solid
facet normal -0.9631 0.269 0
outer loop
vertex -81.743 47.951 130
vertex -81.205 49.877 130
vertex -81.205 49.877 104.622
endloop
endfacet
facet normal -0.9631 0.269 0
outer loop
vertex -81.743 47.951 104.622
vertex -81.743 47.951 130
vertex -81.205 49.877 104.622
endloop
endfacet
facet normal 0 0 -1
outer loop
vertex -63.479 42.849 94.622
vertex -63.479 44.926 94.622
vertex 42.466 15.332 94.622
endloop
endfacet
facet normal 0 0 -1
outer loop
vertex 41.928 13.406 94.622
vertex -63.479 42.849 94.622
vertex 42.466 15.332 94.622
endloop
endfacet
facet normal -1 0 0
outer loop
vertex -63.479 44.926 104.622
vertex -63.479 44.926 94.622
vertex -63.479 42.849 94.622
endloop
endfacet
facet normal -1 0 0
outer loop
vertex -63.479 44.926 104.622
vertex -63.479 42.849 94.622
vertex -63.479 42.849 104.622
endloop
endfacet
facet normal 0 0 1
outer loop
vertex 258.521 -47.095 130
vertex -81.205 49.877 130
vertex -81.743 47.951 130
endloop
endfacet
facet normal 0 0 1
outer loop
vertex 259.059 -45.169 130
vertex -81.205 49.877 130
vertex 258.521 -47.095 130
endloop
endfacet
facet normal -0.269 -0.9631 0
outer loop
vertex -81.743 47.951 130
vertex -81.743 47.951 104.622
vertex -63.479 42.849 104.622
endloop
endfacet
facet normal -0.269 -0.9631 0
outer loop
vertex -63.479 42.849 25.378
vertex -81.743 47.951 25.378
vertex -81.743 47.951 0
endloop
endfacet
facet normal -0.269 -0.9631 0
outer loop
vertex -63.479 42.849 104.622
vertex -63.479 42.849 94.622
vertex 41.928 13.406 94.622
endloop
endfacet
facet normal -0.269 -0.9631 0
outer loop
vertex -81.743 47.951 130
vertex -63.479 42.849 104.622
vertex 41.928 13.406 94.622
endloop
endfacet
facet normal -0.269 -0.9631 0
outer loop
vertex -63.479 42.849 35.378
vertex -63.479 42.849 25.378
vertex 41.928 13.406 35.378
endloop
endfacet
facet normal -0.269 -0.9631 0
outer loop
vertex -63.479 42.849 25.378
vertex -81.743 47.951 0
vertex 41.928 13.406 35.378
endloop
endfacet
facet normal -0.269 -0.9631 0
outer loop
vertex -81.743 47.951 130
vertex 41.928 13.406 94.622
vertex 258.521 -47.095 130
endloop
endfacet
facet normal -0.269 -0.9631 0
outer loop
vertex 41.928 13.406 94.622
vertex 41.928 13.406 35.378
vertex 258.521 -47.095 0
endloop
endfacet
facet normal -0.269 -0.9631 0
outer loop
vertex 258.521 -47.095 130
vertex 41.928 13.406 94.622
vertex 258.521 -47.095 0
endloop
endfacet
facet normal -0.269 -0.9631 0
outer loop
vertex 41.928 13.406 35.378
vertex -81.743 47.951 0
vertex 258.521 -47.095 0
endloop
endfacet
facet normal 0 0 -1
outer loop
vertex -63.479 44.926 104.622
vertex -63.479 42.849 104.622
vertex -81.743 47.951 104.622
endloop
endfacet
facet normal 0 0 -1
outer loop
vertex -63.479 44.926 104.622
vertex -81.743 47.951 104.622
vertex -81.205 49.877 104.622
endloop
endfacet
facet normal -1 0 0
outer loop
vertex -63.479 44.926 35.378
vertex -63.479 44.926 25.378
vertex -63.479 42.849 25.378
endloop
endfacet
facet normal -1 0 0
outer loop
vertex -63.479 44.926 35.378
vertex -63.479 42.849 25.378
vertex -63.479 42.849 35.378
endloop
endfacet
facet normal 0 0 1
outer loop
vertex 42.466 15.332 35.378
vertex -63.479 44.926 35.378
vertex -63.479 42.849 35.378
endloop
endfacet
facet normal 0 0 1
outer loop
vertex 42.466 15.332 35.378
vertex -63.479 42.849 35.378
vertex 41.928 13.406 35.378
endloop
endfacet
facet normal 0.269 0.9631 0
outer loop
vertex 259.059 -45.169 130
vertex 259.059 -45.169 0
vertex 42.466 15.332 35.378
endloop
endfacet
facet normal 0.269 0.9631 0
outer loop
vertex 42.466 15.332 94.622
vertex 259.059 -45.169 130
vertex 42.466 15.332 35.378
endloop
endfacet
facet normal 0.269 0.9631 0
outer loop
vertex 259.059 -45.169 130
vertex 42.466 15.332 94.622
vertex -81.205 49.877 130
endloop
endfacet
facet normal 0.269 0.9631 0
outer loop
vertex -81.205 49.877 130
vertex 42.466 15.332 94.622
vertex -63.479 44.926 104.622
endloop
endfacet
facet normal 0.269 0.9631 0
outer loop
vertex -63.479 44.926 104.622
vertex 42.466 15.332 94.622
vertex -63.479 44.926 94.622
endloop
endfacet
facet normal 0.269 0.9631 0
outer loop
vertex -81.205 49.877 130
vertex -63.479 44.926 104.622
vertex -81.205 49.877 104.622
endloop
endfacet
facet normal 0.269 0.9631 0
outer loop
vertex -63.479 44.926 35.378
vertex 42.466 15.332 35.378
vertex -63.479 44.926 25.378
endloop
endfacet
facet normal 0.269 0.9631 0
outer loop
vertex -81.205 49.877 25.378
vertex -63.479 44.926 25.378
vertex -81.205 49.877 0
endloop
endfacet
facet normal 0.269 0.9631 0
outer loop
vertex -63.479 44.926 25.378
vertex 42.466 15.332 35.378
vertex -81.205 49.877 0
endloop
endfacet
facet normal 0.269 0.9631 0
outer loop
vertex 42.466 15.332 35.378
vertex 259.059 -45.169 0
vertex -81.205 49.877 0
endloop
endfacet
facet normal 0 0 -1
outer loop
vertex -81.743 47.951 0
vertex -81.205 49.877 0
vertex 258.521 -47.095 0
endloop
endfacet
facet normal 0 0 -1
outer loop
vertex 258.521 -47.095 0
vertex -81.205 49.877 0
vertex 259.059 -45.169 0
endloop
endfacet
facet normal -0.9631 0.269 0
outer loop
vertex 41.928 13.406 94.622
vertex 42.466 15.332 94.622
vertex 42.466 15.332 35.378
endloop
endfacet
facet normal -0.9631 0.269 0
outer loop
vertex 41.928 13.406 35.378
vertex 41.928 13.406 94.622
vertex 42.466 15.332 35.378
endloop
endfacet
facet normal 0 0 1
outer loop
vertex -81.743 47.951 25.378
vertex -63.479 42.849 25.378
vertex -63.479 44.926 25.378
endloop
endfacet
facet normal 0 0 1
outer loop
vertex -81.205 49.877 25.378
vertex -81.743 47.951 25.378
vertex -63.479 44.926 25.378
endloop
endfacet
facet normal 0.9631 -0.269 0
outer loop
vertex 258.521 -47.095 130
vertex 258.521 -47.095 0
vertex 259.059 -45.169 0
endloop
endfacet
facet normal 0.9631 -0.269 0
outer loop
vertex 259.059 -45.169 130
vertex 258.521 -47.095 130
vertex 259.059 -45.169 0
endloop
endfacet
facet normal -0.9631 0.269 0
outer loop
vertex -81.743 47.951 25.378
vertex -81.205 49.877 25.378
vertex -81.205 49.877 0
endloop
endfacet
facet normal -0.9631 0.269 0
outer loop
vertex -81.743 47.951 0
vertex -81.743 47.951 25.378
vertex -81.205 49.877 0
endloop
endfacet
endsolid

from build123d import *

# Parameters (mm, degrees)
BOSS_EXTRU_1_DEPTH      = 130
ESQUISSE2_W             = 2
ESQUISSE2_H             = 130
BOSS_EXTRU_2_DEPTH      = 96
ESQUISSE3_W             = 79.24305049
ESQUISSE3_H             = 150.673405859
ENL_V_MAT_EXTRU_1_DEPTH = 200
SKETCH1_W               = 504.296840386
SKETCH1_H               = 634.364351256
CUT_EXTRUDE1_DEPTH      = 345.11586261
SKETCH2_W               = 74.041478535
SKETCH2_H               = 186.425865598
CUT_EXTRUDE3_DEPTH      = 293.644673853
SKETCH3_W               = 110
SKETCH3_H               = 59.24305049
CUT_EXTRUDE4_DEPTH      = 293.644673853


with BuildPart() as part:
    # Esquisse1 → Boss.-Extru.1 (new body)
    with BuildSketch(Plane.XY):
        with BuildLine():
            Line((-99.346696614, 52.867973953), (258.521314081, -47.095157526))
            Line((258.521314081, -47.095157526), (259.05937636, -45.168894568))
            Line((259.05937636, -45.168894568), (-98.808634335, 54.794236911))
            ThreePointArc((-98.808634335, 54.794236911), (-99.208409273, 54.877062462), (-99.615727753, 54.904842474))
            Line((-99.615727753, 54.904842474), (-260.478685919, 54.904842474))
            ThreePointArc((-260.478685919, 54.904842474), (-262.600006262, 54.026162817), (-263.478685919, 51.904842474))
            Line((-263.478685919, 51.904842474), (-263.478685919, -47.095157526))
            Line((-263.478685919, -47.095157526), (-261.478685919, -47.095157526))
            Line((-261.478685919, -47.095157526), (-261.478685919, 51.904842474))
            ThreePointArc((-261.478685919, 51.904842474), (-261.1857927, 52.611949255), (-260.478685919, 52.904842474))
            Line((-260.478685919, 52.904842474), (-99.615727753, 52.904842474))
            ThreePointArc((-99.615727753, 52.904842474), (-99.479954927, 52.89558247), (-99.346696614, 52.867973953))
        make_face()
    extrude(amount=BOSS_EXTRU_1_DEPTH)

    # Esquisse2 → Boss.-Extru.2 (add)
    with BuildSketch(Plane.XZ.offset(47.095157526)):
        with Locations((-262.478685919, 65)):
            Rectangle(ESQUISSE2_W, ESQUISSE2_H)
    extrude(amount=BOSS_EXTRU_2_DEPTH)

    # Esquisse3 → Enlèv. mat.-Extru.1 (cut)
    with BuildSketch(Plane.ZY.offset(263.478685919)):
        with Locations((65, -17.758454597)):
            Rectangle(ESQUISSE3_W, ESQUISSE3_H)
    extrude(amount=-ENL_V_MAT_EXTRU_1_DEPTH, mode=Mode.SUBTRACT)

    # Sketch1 → Cut-Extrude1 (cut, through all)
    with BuildSketch(Plane(origin=(7.046316972, 25.225814758, 0), x_dir=(0.9631314790964218, -0.2690311394124084, 0), z_dir=(0.2690311394124084, 0.9631314790964218, 0))):
        with Locations((-363.353604044, 147.785884009)):
            Rectangle(SKETCH1_W, SKETCH1_H)
    extrude(amount=-CUT_EXTRUDE1_DEPTH, mode=Mode.SUBTRACT)

    # Sketch2 → Cut-Extrude3 (cut, through all)
    with BuildSketch(Plane(origin=(7.046316972, 25.225814758, 0), x_dir=(0.9631314790964218, -0.2690311394124084, 0), z_dir=(0.2690311394124084, 0.9631314790964218, 0))):
        with Locations((-128.650675605, -53.320838207)):
            Rectangle(SKETCH2_W, SKETCH2_H)
    extrude(amount=-CUT_EXTRUDE3_DEPTH, mode=Mode.SUBTRACT)

    # Sketch3 → Cut-Extrude4 (cut, through all)
    with BuildSketch(Plane(origin=(7.046316972, 25.225814758, 0), x_dir=(0.9631314790964218, -0.2690311394124084, 0), z_dir=(0.2690311394124084, 0.9631314790964218, 0))):
        with Locations((-18.224688862, -65)):
            Rectangle(SKETCH3_W, SKETCH3_H)
    extrude(amount=-CUT_EXTRUDE4_DEPTH, mode=Mode.SUBTRACT)


solid = part.part
